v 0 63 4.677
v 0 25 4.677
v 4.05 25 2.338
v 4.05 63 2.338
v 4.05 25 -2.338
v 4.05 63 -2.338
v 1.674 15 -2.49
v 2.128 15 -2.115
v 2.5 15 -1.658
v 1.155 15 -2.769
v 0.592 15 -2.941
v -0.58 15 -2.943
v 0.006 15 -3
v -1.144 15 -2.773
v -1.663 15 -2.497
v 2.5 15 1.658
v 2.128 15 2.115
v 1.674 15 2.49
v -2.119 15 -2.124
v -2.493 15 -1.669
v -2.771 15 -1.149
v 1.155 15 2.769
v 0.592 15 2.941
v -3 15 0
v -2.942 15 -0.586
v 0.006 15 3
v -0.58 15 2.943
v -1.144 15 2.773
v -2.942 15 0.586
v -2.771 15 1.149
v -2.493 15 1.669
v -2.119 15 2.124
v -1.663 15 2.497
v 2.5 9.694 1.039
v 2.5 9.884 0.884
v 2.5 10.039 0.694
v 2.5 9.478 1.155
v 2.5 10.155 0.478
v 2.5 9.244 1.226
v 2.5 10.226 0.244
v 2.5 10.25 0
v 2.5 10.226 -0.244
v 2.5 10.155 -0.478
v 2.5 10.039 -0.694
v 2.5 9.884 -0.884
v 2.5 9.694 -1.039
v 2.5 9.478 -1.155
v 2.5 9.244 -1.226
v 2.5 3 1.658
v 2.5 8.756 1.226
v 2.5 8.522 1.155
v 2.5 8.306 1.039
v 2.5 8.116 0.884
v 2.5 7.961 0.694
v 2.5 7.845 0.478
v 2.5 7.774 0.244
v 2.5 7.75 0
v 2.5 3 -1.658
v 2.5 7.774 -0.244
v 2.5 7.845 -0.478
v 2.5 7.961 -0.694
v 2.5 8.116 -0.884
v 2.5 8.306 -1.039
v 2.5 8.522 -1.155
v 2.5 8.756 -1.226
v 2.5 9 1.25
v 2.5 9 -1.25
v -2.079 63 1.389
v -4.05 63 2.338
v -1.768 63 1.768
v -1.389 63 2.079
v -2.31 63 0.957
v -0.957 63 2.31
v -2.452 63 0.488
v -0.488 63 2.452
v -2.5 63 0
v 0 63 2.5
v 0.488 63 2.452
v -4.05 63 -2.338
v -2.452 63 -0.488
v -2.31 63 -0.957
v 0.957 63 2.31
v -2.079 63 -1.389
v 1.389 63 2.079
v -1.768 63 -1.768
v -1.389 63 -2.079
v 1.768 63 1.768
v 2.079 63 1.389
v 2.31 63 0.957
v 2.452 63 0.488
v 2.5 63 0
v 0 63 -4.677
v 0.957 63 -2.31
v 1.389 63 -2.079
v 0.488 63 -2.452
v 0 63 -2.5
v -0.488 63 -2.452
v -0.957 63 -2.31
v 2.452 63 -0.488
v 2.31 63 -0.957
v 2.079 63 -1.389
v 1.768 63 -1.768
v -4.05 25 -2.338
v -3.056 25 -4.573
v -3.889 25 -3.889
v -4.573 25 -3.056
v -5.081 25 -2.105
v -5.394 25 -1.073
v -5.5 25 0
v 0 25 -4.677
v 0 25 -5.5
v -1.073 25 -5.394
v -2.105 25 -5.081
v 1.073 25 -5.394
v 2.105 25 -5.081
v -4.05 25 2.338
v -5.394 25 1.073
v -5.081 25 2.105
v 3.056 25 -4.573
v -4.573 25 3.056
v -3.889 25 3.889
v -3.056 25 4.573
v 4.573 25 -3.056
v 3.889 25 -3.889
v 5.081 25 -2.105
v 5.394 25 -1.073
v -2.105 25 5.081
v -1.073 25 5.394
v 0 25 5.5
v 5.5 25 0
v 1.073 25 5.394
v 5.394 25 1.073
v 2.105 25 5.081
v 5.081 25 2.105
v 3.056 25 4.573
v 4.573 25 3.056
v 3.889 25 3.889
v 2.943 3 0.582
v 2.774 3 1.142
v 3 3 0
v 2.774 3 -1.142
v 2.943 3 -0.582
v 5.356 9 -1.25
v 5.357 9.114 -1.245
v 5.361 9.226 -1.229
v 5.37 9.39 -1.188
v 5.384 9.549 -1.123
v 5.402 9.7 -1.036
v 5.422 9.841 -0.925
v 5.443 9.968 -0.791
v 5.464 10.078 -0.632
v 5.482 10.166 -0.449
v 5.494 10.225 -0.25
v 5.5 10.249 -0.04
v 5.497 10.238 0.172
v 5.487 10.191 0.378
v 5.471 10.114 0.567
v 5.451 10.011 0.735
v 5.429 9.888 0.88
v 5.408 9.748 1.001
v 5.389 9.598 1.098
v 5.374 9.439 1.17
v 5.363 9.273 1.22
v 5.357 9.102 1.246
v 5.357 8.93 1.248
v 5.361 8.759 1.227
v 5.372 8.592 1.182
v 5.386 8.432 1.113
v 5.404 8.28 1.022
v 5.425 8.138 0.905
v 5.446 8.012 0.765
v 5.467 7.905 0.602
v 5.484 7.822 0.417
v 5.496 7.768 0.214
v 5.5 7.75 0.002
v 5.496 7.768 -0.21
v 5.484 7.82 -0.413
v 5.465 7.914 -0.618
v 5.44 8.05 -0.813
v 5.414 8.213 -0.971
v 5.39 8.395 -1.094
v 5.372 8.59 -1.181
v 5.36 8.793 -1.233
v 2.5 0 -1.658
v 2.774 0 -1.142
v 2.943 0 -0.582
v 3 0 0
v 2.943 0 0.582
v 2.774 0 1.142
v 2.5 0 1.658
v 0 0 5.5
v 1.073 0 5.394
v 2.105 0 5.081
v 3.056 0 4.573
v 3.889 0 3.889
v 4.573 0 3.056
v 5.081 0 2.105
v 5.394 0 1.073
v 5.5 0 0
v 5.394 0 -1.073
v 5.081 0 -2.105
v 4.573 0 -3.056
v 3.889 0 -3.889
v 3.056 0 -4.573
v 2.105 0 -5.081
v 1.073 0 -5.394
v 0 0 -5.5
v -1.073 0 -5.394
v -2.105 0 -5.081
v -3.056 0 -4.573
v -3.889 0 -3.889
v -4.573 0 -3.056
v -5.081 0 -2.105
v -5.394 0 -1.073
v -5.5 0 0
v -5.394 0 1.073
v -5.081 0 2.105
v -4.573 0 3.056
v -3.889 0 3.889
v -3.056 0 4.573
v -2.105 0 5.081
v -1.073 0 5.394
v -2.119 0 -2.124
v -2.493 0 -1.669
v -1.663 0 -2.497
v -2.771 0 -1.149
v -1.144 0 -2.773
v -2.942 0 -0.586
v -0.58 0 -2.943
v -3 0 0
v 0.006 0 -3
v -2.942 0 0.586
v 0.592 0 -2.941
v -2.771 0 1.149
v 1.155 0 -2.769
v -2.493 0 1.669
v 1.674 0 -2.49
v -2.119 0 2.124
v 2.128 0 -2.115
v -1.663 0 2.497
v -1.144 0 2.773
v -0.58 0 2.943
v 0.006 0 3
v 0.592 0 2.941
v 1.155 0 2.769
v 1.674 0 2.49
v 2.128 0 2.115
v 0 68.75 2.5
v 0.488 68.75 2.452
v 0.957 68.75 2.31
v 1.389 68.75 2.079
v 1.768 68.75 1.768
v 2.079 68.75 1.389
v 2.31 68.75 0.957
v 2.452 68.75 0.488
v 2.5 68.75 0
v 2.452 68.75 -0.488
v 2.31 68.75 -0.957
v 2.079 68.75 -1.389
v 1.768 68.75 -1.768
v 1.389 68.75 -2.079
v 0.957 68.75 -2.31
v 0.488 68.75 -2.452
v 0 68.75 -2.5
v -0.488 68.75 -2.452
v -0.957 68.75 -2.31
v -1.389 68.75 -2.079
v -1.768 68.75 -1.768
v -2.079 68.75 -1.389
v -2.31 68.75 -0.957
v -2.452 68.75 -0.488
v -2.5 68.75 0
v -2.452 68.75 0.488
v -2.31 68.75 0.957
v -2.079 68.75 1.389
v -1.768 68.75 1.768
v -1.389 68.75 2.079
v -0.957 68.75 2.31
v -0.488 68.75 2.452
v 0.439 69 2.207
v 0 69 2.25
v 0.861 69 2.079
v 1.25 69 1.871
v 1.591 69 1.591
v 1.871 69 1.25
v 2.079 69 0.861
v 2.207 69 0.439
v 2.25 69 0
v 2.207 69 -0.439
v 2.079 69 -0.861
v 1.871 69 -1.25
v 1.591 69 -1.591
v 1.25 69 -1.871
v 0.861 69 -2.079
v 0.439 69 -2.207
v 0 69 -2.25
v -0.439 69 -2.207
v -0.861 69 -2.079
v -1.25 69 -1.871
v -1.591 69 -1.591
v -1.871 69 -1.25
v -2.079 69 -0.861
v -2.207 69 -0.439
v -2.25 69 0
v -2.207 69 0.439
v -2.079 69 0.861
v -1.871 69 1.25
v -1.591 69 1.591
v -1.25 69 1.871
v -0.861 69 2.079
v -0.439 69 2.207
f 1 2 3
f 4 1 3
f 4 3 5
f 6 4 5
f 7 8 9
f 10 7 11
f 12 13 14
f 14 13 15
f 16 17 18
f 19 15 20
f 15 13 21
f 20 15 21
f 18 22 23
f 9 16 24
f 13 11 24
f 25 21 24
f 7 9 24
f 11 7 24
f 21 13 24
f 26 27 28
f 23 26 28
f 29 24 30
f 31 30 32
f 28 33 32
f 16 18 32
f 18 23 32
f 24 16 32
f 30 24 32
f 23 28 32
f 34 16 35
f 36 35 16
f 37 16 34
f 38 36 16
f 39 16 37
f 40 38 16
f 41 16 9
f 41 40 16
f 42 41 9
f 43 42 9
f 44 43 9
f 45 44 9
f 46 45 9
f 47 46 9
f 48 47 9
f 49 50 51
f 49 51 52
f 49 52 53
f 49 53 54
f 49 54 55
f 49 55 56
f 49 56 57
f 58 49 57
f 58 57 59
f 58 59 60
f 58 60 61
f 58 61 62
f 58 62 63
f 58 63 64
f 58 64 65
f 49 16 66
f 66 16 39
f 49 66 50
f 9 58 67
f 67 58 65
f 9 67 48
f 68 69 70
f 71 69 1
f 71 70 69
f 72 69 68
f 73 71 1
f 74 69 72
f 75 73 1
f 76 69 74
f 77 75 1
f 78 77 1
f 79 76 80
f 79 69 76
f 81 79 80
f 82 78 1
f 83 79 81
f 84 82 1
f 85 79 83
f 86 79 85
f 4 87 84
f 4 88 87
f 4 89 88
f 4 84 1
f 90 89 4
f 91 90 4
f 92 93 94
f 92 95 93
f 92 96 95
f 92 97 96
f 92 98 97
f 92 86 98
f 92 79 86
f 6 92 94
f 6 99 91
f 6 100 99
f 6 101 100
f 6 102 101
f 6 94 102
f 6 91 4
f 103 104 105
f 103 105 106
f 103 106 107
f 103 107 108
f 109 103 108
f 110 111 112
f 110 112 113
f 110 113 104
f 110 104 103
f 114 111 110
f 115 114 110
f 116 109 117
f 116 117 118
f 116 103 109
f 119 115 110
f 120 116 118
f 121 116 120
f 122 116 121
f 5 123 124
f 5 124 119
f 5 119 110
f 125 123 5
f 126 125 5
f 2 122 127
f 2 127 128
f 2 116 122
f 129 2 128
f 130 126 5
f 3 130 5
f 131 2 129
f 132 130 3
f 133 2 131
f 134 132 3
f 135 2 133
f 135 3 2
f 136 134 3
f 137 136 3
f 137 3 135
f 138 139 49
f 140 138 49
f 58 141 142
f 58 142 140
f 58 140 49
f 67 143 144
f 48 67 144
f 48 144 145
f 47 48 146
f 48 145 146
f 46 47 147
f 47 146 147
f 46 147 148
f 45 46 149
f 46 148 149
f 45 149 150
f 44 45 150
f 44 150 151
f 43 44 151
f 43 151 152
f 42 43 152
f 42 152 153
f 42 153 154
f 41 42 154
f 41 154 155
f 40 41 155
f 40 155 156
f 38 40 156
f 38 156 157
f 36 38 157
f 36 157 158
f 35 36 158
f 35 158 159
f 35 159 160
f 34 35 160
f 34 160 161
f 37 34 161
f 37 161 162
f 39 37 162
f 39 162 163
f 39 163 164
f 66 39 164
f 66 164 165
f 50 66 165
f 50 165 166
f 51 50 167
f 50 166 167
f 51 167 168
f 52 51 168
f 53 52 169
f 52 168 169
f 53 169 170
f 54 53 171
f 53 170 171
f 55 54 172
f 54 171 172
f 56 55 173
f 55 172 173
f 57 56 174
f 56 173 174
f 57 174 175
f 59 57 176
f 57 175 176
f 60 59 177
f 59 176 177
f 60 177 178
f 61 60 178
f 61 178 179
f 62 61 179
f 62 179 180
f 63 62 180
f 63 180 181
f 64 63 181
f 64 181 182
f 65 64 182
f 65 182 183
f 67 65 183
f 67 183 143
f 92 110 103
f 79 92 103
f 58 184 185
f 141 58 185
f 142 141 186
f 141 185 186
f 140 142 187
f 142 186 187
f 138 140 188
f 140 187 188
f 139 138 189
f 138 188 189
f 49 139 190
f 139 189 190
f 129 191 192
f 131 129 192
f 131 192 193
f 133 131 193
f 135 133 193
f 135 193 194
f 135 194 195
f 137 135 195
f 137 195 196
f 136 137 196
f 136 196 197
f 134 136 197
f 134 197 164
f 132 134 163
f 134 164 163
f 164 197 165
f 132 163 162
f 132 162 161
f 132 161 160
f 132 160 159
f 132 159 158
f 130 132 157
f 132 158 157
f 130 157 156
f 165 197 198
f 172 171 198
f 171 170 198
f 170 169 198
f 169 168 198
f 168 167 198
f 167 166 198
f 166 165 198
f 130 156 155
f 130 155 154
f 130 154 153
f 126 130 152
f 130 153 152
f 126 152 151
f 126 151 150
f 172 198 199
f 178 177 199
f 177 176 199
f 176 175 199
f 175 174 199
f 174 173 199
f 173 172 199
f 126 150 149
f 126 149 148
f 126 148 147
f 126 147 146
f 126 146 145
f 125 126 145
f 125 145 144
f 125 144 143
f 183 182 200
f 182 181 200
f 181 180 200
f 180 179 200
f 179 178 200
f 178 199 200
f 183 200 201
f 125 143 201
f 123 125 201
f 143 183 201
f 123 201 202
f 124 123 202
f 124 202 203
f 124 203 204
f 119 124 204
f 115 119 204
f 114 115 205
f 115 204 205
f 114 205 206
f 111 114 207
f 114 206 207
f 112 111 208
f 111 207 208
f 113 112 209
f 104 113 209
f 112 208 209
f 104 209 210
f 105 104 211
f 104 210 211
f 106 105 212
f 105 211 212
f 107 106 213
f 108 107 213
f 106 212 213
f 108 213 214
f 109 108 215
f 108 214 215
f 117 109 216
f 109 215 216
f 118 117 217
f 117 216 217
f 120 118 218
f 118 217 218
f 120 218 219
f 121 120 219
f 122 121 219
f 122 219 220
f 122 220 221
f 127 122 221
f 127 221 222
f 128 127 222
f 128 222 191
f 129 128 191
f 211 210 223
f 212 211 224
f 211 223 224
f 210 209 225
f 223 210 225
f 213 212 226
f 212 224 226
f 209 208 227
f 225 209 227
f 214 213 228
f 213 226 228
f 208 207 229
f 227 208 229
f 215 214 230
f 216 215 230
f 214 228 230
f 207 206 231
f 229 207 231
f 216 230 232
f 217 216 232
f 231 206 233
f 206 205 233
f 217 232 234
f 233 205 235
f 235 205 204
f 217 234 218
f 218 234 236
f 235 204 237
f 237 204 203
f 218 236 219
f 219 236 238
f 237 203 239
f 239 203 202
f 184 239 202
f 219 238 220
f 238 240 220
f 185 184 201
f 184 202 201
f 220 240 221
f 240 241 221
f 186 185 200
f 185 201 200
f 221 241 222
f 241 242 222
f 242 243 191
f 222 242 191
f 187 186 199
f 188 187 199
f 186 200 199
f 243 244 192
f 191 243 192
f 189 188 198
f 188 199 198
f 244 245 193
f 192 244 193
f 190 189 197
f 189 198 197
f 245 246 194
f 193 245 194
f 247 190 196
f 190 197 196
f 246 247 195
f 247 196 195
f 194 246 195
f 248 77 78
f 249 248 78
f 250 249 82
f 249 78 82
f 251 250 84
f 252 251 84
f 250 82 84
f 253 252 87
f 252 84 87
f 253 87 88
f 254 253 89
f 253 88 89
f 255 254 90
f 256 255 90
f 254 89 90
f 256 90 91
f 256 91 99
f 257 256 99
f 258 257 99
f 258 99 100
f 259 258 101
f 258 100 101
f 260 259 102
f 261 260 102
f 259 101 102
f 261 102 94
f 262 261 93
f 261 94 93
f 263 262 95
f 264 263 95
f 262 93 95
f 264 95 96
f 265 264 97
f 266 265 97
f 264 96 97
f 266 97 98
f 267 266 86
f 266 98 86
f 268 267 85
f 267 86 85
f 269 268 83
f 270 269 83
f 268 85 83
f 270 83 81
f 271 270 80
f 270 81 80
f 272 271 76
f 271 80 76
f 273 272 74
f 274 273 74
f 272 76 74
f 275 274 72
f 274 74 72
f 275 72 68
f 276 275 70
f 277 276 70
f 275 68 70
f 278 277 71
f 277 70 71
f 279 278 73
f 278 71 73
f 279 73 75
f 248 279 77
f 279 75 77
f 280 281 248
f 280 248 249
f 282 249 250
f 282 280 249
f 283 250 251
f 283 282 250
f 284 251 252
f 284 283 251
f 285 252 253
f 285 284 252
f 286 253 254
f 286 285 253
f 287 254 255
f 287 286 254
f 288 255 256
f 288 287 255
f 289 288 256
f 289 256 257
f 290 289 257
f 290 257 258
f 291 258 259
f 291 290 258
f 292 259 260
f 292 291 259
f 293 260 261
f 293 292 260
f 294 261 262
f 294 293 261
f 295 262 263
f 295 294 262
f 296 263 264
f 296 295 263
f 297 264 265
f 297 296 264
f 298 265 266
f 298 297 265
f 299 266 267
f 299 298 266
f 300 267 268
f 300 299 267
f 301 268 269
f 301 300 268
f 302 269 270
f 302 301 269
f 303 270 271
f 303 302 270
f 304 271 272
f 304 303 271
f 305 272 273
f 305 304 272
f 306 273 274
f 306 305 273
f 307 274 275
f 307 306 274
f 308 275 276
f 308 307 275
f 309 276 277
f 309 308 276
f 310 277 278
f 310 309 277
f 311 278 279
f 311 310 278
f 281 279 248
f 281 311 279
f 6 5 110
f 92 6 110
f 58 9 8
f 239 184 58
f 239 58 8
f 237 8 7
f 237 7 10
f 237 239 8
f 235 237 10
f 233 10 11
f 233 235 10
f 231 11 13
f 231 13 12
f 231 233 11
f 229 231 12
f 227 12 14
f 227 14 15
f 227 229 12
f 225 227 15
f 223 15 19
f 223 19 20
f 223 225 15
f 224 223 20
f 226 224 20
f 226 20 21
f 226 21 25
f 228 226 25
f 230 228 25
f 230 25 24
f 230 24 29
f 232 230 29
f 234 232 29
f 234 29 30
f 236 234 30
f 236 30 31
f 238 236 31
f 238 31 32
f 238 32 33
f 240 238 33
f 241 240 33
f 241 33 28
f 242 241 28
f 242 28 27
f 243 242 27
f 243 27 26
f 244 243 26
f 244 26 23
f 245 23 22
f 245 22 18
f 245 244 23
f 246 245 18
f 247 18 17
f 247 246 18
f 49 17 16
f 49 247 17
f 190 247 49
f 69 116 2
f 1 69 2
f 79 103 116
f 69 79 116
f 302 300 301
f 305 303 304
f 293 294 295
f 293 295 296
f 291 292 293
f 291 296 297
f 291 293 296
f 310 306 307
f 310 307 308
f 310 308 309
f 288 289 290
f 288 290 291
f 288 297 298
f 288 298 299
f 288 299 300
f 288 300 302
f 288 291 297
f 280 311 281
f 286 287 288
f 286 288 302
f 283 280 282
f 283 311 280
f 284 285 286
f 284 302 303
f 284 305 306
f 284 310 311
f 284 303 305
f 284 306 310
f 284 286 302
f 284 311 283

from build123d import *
from build123d.topology import SkipClean

# Parameters (mm, degrees)
SKETCH_1_R          = 5.5
EXTRUDE_1_DEPTH     = 25
EXTRUDE_2_DEPTH     = 38
SKETCH_3_R          = 2.5
EXTRUDE_4_DEPTH     = 6
CHAMFER_1_SIZE      = 0.25
CUT_EXTRUDE_1_DEPTH = 15
SKETCH_6_R          = 3
CUT_EXTRUDE_2_DEPTH = 3
M3X0_5_1_D          = 2.5
M3X0_5_1_DEPTH      = 3


with BuildPart() as part:
    # Sketch 1 → Extrude 1 (new body)
    with BuildSketch(Plane(origin=(0, 0, 0), x_dir=(1, 0, 0), z_dir=(0, 1, 0))):
        with Locations(Location((0, 0, 0), (0, 0, 270))):  # turned: the seam where the file's is
            Circle(SKETCH_1_R)
    extrude(amount=EXTRUDE_1_DEPTH)

    # Sketch 2 → Extrude 2 (add)
    with BuildSketch(Plane(origin=(0, 25, 0), x_dir=(1, 0, 0), z_dir=(0, 1, 0))):
        Polygon((0, -4.67653718), (4.05, -2.33826859), (4.05, 2.33826859), (0, 4.67653718), (-4.05, 2.33826859), (-4.05, -2.33826859), align=None)
    extrude(amount=EXTRUDE_2_DEPTH)

    # Sketch 3 → Extrude 4 (add)
    with BuildSketch(Plane(origin=(0, 63, 0), x_dir=(1, 0, 0), z_dir=(0, 1, 0))):
        with Locations(Location((0, 0, 0), (0, 0, 270))):  # turned: the seam where the file's is
            Circle(SKETCH_3_R)
    extrude(amount=EXTRUDE_4_DEPTH)

    # Chamfer 1
    chamfer_1_edges = [part.edges().sort_by_distance(p)[0] for p in [
        (0, 69, -2.5),
    ]]
    chamfer(chamfer_1_edges, length=CHAMFER_1_SIZE)

    # Sketch 5 → Cut-Extrude 1 (cut)
    with BuildSketch(Plane.XZ):
        with BuildLine():
            Line((2.5, 1.658312395), (2.5, -1.658312395))
            ThreePointArc((2.5, -1.658312395), (-3, 0), (2.5, 1.658312395))
        make_face()
    extrude(amount=-CUT_EXTRUDE_1_DEPTH, mode=Mode.SUBTRACT)

    # Sketch 6 → Cut-Extrude 2 (cut)
    with SkipClean():  # keep this step's faces unmerged: merging them makes the solid invalid here
        with BuildSketch(Plane.XZ):
            with Locations(Location((0, 0, 0), (0, 0, 270))):  # turned: the seam where the file's is
                Circle(SKETCH_6_R)
        extrude(amount=-CUT_EXTRUDE_2_DEPTH, mode=Mode.SUBTRACT)

    # M3x0.5 _1
    with Locations(Plane.ZY.offset(-2.5)):
        with Locations((0, 9)):
            Hole(M3X0_5_1_D / 2, depth=M3X0_5_1_DEPTH)


solid = part.part
